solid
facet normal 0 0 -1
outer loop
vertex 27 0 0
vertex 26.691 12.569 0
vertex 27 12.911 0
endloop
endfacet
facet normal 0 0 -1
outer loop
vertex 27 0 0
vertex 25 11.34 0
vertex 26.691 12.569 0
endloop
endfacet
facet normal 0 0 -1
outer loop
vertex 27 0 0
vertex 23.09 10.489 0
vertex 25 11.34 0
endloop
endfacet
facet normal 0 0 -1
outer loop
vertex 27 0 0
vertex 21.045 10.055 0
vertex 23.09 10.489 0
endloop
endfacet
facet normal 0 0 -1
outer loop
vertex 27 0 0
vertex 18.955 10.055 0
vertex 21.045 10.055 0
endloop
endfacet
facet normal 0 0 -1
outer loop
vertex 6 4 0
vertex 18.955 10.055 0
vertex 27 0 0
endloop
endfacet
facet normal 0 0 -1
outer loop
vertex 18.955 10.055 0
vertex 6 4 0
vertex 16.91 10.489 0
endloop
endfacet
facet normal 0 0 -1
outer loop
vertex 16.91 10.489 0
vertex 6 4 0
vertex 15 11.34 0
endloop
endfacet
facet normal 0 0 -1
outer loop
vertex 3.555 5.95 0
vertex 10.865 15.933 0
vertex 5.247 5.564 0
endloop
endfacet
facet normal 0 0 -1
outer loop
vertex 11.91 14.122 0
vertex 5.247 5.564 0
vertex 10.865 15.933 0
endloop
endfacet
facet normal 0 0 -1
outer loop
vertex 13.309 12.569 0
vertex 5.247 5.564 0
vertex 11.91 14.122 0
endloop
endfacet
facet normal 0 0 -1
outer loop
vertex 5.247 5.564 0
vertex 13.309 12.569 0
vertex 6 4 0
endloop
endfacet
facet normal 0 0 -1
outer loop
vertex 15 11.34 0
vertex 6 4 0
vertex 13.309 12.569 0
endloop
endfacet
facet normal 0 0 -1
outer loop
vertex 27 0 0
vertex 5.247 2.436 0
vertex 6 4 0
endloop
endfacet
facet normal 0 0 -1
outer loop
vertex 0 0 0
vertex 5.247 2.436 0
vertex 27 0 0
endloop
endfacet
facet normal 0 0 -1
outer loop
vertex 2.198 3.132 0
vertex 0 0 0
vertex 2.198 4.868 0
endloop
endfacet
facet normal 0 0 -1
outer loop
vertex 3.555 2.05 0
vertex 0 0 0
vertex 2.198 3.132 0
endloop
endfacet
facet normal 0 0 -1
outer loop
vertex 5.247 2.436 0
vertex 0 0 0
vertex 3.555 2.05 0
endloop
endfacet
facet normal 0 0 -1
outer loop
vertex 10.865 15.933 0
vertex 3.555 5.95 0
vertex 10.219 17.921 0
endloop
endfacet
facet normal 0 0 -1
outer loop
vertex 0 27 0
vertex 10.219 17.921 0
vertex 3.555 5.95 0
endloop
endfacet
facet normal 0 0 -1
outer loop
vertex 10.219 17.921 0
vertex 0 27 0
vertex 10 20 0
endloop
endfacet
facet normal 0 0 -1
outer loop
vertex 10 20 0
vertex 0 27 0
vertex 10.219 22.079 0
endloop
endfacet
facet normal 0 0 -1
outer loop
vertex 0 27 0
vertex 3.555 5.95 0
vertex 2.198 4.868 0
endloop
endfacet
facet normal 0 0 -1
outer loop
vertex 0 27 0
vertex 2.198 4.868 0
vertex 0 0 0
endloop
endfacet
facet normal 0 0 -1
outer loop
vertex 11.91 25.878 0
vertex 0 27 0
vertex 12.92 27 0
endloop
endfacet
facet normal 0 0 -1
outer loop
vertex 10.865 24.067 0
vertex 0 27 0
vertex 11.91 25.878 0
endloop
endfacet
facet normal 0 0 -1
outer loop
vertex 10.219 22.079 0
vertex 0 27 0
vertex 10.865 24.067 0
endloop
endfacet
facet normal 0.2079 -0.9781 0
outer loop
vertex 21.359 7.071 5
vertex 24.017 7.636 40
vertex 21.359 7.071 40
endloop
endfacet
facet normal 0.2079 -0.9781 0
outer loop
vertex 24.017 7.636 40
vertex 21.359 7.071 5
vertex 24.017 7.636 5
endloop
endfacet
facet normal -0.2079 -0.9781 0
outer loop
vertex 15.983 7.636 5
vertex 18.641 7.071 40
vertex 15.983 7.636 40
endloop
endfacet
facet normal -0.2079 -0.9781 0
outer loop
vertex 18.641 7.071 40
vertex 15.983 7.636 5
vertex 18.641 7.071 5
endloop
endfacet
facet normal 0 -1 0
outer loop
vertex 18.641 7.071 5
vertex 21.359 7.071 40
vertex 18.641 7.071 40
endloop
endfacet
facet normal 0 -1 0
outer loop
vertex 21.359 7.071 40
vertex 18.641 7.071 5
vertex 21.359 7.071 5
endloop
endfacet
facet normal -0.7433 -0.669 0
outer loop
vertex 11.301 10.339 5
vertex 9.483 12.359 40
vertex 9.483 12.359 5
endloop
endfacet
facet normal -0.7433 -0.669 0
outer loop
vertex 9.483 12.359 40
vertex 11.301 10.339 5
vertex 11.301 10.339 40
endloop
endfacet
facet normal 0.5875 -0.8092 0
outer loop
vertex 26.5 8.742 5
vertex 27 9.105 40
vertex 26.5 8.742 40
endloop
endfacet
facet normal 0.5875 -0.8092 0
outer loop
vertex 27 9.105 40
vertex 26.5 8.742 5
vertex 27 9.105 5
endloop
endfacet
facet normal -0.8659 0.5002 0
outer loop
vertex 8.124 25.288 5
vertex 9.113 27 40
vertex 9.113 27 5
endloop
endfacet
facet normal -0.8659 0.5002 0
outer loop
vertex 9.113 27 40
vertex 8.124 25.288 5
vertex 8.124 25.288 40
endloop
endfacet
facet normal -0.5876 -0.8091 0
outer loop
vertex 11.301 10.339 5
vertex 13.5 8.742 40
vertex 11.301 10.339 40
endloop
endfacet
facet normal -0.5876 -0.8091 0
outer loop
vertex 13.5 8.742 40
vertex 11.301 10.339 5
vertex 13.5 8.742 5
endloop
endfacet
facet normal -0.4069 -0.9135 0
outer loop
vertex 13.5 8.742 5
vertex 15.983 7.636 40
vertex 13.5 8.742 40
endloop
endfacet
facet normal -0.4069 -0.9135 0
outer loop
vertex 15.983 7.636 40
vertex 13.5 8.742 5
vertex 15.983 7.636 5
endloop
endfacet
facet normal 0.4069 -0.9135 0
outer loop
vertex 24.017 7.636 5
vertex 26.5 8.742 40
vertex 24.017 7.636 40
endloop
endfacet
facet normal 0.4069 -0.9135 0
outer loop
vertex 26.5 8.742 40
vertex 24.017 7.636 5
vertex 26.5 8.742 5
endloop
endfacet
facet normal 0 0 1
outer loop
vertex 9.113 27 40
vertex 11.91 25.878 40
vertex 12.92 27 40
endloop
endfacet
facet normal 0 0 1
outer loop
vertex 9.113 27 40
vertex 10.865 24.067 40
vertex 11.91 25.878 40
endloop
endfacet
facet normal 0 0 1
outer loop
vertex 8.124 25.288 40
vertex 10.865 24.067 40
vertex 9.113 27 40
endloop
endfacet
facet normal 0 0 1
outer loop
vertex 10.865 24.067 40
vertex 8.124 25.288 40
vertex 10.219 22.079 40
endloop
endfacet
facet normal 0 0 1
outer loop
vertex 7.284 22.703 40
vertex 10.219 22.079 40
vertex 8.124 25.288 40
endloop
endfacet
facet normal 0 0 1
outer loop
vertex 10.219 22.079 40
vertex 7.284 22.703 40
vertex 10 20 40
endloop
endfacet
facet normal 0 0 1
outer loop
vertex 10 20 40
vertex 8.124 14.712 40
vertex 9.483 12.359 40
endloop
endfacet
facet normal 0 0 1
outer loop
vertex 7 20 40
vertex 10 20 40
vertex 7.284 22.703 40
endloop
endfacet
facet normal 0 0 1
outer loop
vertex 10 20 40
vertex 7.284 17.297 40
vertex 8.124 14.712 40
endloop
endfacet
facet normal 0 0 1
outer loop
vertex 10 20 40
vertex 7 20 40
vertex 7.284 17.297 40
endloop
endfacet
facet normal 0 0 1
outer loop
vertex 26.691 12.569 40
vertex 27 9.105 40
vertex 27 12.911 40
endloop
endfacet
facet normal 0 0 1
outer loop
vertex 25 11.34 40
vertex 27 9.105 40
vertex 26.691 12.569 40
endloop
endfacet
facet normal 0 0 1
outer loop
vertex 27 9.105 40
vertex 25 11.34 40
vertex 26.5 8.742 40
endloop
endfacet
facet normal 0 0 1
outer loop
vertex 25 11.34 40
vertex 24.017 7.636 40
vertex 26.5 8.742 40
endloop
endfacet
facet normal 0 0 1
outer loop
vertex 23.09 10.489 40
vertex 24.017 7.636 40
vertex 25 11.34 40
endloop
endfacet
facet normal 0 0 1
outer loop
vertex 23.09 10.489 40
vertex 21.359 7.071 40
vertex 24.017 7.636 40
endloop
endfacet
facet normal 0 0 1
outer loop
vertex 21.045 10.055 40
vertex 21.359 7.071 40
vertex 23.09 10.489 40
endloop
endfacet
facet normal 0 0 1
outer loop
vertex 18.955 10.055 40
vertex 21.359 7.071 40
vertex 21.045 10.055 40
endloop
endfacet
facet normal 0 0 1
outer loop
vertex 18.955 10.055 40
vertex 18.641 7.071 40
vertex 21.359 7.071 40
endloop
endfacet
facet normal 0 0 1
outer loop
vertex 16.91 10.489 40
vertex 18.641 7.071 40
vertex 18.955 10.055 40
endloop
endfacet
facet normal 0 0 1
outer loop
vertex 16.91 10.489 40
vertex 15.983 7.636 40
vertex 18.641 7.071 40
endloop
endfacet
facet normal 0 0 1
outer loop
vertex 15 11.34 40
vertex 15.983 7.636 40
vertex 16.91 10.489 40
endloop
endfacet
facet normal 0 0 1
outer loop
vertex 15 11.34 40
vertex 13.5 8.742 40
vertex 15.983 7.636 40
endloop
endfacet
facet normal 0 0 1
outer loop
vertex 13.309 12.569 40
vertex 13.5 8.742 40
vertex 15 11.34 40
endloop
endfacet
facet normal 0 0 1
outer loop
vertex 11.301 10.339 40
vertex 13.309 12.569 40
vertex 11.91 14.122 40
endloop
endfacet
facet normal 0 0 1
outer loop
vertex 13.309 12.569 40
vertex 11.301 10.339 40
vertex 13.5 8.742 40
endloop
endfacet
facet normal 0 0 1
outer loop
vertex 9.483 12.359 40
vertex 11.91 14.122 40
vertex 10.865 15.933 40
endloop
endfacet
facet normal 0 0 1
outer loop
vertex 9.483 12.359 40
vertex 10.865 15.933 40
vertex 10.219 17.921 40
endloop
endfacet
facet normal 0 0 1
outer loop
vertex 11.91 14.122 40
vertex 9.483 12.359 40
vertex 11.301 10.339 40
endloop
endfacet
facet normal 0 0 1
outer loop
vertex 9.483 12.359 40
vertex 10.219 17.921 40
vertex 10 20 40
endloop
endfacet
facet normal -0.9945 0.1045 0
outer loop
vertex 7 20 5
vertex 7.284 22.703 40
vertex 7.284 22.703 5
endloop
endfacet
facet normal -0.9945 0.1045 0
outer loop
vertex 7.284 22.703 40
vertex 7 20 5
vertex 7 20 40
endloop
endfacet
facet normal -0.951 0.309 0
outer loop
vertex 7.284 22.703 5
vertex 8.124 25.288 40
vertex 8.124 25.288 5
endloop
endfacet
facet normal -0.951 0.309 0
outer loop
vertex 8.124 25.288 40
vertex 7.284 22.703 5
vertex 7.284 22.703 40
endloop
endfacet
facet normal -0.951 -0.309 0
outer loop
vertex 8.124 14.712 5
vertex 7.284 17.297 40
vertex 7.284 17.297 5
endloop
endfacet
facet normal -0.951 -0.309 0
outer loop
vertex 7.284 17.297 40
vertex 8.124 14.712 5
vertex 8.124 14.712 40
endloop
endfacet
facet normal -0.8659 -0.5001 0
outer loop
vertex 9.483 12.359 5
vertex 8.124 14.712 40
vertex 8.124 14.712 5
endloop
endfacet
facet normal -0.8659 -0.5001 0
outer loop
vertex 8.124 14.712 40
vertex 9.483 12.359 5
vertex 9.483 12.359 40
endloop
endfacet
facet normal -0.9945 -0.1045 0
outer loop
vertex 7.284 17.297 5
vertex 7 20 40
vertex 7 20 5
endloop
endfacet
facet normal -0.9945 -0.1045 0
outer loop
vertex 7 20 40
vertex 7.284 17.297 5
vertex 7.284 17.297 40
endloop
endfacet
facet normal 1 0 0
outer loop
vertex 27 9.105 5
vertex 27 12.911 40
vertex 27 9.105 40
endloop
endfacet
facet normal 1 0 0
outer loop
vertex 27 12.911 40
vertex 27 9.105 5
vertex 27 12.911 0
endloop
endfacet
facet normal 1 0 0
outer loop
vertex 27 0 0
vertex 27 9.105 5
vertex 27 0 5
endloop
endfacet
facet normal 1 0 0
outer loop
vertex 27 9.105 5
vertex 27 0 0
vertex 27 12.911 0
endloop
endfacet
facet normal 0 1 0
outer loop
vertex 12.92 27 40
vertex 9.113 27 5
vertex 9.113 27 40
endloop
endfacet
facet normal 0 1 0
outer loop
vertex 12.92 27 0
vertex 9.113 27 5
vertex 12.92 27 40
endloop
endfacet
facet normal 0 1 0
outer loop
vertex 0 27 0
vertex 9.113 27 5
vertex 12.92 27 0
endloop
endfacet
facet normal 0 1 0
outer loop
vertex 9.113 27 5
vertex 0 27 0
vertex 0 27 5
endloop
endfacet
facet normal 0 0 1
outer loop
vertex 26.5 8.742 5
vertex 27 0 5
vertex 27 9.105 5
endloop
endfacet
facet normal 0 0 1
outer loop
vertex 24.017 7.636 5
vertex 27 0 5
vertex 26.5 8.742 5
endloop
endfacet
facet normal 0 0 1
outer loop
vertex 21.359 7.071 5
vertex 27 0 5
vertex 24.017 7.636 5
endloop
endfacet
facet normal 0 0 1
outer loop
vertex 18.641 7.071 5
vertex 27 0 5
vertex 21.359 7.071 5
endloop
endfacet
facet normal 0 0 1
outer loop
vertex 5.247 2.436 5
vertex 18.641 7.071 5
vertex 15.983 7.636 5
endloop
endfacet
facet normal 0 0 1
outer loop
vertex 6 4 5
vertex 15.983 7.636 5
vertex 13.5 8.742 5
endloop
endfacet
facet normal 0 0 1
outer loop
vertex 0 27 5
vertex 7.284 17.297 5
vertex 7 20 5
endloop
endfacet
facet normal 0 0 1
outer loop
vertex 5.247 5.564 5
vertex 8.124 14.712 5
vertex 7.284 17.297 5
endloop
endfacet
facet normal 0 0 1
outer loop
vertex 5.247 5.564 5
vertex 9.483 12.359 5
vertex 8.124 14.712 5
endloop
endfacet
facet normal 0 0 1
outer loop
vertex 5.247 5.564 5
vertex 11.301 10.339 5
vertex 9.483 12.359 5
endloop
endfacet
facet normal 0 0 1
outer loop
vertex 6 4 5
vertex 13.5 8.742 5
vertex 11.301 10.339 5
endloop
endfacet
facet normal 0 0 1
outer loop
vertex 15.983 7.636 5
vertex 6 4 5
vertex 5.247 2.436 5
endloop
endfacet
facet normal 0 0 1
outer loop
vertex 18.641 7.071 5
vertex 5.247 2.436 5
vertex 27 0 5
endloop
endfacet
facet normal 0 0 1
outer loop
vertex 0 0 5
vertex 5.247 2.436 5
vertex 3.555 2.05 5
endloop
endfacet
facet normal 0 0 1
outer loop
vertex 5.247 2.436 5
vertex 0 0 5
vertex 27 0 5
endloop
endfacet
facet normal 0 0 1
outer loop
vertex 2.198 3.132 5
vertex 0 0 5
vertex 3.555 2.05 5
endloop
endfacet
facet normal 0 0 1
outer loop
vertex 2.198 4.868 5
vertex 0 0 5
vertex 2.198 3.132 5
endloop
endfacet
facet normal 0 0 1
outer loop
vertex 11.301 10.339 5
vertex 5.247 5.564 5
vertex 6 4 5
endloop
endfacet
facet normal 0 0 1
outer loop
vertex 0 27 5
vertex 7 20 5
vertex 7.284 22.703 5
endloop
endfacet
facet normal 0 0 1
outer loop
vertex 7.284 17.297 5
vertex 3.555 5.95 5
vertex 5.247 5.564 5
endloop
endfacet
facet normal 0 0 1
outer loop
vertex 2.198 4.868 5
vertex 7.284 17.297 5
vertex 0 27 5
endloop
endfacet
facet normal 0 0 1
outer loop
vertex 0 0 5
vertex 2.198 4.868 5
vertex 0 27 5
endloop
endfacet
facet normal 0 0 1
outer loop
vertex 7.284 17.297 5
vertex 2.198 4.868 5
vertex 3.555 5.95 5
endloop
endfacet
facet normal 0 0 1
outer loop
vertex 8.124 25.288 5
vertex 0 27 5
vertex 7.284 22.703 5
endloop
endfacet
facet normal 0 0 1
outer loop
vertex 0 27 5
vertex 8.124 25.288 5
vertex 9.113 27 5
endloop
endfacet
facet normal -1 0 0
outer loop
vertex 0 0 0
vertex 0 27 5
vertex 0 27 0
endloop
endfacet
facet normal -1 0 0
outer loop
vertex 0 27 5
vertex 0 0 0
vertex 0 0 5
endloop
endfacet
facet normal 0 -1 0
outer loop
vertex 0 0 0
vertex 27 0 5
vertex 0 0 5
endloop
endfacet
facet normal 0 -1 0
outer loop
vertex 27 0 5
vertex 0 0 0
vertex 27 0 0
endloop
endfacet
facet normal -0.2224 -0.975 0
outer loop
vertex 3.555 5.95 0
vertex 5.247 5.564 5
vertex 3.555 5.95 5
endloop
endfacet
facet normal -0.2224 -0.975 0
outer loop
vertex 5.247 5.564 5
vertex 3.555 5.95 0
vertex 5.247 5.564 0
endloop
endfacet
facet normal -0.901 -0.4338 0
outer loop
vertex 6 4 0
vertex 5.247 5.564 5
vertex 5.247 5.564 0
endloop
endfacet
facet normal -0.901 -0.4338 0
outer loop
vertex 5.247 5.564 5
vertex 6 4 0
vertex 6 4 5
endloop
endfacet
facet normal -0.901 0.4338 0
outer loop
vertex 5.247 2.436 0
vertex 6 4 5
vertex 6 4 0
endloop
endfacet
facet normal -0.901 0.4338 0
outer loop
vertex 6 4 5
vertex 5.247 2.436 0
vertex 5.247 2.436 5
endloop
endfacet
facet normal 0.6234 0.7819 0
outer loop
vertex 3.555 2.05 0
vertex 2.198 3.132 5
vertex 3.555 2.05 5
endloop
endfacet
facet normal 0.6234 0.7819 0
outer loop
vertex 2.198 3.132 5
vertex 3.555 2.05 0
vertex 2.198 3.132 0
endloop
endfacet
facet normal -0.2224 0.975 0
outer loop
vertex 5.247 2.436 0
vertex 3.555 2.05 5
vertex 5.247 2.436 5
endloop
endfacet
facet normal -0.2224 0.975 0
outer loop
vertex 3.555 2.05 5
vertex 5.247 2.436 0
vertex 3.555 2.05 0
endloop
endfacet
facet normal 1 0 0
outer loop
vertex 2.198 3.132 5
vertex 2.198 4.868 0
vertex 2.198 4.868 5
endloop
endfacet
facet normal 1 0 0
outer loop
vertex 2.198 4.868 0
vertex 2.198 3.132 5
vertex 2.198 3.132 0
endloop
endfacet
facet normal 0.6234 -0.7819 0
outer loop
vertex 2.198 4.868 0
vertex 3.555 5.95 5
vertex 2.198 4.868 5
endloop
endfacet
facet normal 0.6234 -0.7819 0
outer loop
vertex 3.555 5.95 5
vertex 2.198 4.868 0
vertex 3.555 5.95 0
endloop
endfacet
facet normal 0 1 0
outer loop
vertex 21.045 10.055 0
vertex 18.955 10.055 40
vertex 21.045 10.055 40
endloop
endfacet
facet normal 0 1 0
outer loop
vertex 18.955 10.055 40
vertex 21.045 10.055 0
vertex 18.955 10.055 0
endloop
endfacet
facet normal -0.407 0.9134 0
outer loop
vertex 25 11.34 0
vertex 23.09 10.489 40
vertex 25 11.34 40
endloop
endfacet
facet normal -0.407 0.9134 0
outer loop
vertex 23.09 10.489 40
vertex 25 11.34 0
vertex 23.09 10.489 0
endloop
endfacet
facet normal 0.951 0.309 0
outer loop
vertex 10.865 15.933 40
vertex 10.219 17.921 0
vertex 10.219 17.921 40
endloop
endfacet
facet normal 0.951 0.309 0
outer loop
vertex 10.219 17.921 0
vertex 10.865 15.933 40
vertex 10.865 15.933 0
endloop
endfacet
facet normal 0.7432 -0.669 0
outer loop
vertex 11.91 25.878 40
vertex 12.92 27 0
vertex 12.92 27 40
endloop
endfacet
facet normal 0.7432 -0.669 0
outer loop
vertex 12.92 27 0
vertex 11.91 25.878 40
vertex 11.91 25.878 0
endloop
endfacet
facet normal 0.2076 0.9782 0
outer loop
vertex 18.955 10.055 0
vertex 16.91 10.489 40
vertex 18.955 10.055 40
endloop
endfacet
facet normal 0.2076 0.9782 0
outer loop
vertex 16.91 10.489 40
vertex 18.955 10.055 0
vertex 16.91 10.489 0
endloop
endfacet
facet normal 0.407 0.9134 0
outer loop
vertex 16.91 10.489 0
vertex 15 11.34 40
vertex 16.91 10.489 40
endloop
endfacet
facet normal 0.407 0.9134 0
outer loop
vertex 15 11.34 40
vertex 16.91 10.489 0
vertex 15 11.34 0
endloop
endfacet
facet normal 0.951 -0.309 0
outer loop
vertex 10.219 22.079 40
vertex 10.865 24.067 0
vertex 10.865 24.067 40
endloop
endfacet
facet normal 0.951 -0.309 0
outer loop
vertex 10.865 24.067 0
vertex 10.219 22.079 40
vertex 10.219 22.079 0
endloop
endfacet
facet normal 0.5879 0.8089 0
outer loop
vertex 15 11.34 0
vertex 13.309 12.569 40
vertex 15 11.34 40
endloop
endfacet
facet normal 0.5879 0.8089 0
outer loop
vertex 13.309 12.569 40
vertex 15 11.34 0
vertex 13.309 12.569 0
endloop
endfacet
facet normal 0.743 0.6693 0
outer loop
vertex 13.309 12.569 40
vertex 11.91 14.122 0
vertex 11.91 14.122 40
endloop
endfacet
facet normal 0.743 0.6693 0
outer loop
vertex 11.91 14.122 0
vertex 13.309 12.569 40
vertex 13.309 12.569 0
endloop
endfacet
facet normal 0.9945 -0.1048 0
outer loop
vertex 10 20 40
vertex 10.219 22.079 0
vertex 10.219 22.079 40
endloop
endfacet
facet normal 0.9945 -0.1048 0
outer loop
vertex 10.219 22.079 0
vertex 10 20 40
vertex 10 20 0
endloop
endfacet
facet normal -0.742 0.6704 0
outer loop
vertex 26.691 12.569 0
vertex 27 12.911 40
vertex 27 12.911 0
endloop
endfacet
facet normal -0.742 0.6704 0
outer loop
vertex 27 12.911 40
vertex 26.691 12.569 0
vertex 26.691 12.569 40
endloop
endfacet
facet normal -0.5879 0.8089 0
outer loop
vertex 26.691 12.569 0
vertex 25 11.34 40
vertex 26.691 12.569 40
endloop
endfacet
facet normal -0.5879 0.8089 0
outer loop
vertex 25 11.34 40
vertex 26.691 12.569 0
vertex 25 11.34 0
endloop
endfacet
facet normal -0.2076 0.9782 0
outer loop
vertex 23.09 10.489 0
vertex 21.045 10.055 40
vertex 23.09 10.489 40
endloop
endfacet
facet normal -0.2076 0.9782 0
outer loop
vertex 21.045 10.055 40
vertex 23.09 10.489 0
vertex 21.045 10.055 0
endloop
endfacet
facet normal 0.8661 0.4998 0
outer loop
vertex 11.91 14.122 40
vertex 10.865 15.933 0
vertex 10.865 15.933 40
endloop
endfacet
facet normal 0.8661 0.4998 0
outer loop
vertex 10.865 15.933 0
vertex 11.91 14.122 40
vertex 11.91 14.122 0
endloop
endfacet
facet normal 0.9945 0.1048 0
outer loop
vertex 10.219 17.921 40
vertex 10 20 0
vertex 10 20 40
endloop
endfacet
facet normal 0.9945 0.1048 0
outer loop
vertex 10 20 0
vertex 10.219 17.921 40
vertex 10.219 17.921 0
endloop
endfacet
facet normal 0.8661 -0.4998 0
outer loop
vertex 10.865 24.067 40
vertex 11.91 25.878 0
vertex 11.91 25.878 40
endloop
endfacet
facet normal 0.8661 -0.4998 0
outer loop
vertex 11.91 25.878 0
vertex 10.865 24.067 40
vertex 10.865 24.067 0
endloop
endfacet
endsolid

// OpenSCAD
difference() {
	union() {
		cube([27, 27, 5]);
		intersection() {
			translate([20, 20, 0]) cylinder(40, 13, 13);
			cube([27, 27, 500]);
		}
	}
	translate([4, 4, 0]) cylinder(500, 2, 2);
	translate([20, 20, 0]) cylinder(500, 10, 10);
}
